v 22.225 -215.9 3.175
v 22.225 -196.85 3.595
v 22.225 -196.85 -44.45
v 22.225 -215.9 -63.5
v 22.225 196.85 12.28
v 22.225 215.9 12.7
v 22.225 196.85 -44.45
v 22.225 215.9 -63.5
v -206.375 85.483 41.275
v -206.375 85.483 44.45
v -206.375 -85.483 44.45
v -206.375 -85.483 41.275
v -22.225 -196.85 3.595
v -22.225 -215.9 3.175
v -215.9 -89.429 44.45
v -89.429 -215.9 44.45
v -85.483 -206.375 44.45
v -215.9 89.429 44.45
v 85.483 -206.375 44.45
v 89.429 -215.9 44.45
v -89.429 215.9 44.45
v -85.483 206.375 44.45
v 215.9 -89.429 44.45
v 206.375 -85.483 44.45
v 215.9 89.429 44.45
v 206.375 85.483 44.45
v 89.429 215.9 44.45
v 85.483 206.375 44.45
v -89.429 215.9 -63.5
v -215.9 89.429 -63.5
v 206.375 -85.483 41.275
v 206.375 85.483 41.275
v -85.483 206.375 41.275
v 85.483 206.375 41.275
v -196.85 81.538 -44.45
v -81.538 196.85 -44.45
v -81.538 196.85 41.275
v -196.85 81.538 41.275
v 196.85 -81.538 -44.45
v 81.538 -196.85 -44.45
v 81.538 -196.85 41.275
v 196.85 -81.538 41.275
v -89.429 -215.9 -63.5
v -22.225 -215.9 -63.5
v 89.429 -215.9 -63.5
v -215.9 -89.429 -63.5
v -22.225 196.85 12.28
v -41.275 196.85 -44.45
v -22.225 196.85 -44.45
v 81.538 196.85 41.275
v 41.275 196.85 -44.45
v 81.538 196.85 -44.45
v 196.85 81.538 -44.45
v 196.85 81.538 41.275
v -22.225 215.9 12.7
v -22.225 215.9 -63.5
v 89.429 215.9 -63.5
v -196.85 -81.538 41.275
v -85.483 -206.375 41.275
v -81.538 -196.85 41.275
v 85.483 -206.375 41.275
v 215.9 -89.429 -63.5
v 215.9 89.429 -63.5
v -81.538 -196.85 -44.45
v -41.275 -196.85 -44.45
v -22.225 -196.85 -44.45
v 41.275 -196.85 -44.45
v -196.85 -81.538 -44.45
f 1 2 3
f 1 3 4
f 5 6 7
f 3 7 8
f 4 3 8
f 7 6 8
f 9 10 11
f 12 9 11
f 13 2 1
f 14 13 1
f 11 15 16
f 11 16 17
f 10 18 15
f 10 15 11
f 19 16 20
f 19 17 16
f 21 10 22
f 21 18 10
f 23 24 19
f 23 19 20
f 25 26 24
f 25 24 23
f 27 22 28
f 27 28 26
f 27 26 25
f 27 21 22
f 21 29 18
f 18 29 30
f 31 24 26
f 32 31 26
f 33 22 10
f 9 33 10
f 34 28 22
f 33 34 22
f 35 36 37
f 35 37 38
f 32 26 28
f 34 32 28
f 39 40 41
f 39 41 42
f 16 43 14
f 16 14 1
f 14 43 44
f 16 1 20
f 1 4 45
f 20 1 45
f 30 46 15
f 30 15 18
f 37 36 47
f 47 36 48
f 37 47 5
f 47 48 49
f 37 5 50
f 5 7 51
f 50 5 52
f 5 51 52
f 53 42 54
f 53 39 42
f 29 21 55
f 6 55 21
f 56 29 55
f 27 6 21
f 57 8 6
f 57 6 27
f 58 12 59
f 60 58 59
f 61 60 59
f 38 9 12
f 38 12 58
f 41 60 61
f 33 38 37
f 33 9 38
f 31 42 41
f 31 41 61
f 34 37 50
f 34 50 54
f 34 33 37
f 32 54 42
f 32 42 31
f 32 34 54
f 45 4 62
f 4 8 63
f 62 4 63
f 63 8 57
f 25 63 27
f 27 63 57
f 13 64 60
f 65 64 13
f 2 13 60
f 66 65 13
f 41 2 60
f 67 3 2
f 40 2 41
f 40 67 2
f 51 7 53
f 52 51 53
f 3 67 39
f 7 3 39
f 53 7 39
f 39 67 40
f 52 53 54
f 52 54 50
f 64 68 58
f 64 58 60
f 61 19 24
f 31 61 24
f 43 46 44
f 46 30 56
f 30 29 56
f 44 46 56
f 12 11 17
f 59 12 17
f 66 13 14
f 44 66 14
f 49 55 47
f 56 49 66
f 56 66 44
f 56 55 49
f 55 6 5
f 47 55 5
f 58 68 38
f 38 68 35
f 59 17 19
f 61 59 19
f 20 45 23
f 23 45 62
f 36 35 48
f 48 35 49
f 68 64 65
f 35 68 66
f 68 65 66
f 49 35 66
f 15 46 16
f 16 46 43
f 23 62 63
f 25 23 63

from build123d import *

# Parameters (mm, degrees)
BOSS_EXTRUDE1_DEPTH      = 44.45
BOSS_EXTRUDE1_DEPTH_BACK = 63.5
SKETCH1_W                = 431.8
SKETCH1_H                = 431.8
CUT_EXTRUDE1_DEPTH       = 324.85
CUT_EXTRUDE1_DEPTH_BACK  = 324.85
SKETCH2_OUTSIDE_W        = 557.826
SKETCH2_OUTSIDE_H        = 557.826
CUT_EXTRUDE5_DEPTH       = 22.225
SHELL1_T                 = -19.05
CUT_EXTRUDE3_DEPTH       = 3.175
SKETCH5_W                = 120.0338561
SKETCH5_H                = 81.699458139
CUT_EXTRUDE4_DEPTH       = 393.7


with BuildPart() as part:
    # Sketch1 → Boss-Extrude1 (new, two sides: drawn at the far end of the back side and taken through both)
    with BuildSketch(Plane.XY.offset(-BOSS_EXTRUDE1_DEPTH_BACK)):
        Rectangle(SKETCH1_W, SKETCH1_H)
    extrude(amount=BOSS_EXTRUDE1_DEPTH + BOSS_EXTRUDE1_DEPTH_BACK)

    # Sketch2 outside → Cut-Extrude1 (cut, two sides: drawn at the far end of the back side and taken through both)
    with BuildSketch(Plane.XY.offset(44.45).offset(-CUT_EXTRUDE1_DEPTH_BACK)):
        Rectangle(SKETCH2_OUTSIDE_W, SKETCH2_OUTSIDE_H)
        Polygon((-215.9, 89.428708116), (-215.9, -89.428708116), (-89.428708116, -215.9), (89.428708116, -215.9), (215.9, -89.428708116), (215.9, 89.428708116), (89.428708116, 215.9), (-89.428708116, 215.9), align=None, mode=Mode.SUBTRACT)
    extrude(amount=CUT_EXTRUDE1_DEPTH + CUT_EXTRUDE1_DEPTH_BACK, mode=Mode.SUBTRACT)

    # Sketch6 → Cut-Extrude5 (cut, symmetric)
    with BuildSketch(Plane(origin=(0, 0, 0), x_dir=(0, 0, -1), z_dir=(1, 0, 0))):
        Polygon((-12.7, 215.9), (-3.175, -215.9), (63.5, -215.9), (63.5, 215.9), align=None)
    extrude(amount=CUT_EXTRUDE5_DEPTH, both=True, mode=Mode.SUBTRACT)

    # Shell1
    shell1_openings = [part.faces().sort_by_distance(p)[0] for p in [
        (0, 0, 44.45),
    ]]
    offset(amount=SHELL1_T, openings=shell1_openings, kind=Kind.INTERSECTION)

    # Sketch4 → Cut-Extrude3 (cut)
    with BuildSketch(Plane.XY.offset(44.45)):
        Polygon((85.483323935, 206.375), (-85.483323935, 206.375), (-206.375, 85.483323935), (-206.375, -85.483323935), (-85.483323935, -206.375), (85.483323935, -206.375), (206.375, -85.483323935), (206.375, 85.483323935), align=None)
    extrude(amount=-CUT_EXTRUDE3_DEPTH, mode=Mode.SUBTRACT)

    # Sketch5 → Cut-Extrude4 (cut)
    with BuildSketch(Plane(origin=(0, -196.85, 0), x_dir=(1, 0, 0), z_dir=(0, 1, 0))):
        with Locations((1.389541827, 3.60027093)):
            Rectangle(SKETCH5_W, SKETCH5_H)
    extrude(amount=CUT_EXTRUDE4_DEPTH, mode=Mode.SUBTRACT)


solid = part.part
